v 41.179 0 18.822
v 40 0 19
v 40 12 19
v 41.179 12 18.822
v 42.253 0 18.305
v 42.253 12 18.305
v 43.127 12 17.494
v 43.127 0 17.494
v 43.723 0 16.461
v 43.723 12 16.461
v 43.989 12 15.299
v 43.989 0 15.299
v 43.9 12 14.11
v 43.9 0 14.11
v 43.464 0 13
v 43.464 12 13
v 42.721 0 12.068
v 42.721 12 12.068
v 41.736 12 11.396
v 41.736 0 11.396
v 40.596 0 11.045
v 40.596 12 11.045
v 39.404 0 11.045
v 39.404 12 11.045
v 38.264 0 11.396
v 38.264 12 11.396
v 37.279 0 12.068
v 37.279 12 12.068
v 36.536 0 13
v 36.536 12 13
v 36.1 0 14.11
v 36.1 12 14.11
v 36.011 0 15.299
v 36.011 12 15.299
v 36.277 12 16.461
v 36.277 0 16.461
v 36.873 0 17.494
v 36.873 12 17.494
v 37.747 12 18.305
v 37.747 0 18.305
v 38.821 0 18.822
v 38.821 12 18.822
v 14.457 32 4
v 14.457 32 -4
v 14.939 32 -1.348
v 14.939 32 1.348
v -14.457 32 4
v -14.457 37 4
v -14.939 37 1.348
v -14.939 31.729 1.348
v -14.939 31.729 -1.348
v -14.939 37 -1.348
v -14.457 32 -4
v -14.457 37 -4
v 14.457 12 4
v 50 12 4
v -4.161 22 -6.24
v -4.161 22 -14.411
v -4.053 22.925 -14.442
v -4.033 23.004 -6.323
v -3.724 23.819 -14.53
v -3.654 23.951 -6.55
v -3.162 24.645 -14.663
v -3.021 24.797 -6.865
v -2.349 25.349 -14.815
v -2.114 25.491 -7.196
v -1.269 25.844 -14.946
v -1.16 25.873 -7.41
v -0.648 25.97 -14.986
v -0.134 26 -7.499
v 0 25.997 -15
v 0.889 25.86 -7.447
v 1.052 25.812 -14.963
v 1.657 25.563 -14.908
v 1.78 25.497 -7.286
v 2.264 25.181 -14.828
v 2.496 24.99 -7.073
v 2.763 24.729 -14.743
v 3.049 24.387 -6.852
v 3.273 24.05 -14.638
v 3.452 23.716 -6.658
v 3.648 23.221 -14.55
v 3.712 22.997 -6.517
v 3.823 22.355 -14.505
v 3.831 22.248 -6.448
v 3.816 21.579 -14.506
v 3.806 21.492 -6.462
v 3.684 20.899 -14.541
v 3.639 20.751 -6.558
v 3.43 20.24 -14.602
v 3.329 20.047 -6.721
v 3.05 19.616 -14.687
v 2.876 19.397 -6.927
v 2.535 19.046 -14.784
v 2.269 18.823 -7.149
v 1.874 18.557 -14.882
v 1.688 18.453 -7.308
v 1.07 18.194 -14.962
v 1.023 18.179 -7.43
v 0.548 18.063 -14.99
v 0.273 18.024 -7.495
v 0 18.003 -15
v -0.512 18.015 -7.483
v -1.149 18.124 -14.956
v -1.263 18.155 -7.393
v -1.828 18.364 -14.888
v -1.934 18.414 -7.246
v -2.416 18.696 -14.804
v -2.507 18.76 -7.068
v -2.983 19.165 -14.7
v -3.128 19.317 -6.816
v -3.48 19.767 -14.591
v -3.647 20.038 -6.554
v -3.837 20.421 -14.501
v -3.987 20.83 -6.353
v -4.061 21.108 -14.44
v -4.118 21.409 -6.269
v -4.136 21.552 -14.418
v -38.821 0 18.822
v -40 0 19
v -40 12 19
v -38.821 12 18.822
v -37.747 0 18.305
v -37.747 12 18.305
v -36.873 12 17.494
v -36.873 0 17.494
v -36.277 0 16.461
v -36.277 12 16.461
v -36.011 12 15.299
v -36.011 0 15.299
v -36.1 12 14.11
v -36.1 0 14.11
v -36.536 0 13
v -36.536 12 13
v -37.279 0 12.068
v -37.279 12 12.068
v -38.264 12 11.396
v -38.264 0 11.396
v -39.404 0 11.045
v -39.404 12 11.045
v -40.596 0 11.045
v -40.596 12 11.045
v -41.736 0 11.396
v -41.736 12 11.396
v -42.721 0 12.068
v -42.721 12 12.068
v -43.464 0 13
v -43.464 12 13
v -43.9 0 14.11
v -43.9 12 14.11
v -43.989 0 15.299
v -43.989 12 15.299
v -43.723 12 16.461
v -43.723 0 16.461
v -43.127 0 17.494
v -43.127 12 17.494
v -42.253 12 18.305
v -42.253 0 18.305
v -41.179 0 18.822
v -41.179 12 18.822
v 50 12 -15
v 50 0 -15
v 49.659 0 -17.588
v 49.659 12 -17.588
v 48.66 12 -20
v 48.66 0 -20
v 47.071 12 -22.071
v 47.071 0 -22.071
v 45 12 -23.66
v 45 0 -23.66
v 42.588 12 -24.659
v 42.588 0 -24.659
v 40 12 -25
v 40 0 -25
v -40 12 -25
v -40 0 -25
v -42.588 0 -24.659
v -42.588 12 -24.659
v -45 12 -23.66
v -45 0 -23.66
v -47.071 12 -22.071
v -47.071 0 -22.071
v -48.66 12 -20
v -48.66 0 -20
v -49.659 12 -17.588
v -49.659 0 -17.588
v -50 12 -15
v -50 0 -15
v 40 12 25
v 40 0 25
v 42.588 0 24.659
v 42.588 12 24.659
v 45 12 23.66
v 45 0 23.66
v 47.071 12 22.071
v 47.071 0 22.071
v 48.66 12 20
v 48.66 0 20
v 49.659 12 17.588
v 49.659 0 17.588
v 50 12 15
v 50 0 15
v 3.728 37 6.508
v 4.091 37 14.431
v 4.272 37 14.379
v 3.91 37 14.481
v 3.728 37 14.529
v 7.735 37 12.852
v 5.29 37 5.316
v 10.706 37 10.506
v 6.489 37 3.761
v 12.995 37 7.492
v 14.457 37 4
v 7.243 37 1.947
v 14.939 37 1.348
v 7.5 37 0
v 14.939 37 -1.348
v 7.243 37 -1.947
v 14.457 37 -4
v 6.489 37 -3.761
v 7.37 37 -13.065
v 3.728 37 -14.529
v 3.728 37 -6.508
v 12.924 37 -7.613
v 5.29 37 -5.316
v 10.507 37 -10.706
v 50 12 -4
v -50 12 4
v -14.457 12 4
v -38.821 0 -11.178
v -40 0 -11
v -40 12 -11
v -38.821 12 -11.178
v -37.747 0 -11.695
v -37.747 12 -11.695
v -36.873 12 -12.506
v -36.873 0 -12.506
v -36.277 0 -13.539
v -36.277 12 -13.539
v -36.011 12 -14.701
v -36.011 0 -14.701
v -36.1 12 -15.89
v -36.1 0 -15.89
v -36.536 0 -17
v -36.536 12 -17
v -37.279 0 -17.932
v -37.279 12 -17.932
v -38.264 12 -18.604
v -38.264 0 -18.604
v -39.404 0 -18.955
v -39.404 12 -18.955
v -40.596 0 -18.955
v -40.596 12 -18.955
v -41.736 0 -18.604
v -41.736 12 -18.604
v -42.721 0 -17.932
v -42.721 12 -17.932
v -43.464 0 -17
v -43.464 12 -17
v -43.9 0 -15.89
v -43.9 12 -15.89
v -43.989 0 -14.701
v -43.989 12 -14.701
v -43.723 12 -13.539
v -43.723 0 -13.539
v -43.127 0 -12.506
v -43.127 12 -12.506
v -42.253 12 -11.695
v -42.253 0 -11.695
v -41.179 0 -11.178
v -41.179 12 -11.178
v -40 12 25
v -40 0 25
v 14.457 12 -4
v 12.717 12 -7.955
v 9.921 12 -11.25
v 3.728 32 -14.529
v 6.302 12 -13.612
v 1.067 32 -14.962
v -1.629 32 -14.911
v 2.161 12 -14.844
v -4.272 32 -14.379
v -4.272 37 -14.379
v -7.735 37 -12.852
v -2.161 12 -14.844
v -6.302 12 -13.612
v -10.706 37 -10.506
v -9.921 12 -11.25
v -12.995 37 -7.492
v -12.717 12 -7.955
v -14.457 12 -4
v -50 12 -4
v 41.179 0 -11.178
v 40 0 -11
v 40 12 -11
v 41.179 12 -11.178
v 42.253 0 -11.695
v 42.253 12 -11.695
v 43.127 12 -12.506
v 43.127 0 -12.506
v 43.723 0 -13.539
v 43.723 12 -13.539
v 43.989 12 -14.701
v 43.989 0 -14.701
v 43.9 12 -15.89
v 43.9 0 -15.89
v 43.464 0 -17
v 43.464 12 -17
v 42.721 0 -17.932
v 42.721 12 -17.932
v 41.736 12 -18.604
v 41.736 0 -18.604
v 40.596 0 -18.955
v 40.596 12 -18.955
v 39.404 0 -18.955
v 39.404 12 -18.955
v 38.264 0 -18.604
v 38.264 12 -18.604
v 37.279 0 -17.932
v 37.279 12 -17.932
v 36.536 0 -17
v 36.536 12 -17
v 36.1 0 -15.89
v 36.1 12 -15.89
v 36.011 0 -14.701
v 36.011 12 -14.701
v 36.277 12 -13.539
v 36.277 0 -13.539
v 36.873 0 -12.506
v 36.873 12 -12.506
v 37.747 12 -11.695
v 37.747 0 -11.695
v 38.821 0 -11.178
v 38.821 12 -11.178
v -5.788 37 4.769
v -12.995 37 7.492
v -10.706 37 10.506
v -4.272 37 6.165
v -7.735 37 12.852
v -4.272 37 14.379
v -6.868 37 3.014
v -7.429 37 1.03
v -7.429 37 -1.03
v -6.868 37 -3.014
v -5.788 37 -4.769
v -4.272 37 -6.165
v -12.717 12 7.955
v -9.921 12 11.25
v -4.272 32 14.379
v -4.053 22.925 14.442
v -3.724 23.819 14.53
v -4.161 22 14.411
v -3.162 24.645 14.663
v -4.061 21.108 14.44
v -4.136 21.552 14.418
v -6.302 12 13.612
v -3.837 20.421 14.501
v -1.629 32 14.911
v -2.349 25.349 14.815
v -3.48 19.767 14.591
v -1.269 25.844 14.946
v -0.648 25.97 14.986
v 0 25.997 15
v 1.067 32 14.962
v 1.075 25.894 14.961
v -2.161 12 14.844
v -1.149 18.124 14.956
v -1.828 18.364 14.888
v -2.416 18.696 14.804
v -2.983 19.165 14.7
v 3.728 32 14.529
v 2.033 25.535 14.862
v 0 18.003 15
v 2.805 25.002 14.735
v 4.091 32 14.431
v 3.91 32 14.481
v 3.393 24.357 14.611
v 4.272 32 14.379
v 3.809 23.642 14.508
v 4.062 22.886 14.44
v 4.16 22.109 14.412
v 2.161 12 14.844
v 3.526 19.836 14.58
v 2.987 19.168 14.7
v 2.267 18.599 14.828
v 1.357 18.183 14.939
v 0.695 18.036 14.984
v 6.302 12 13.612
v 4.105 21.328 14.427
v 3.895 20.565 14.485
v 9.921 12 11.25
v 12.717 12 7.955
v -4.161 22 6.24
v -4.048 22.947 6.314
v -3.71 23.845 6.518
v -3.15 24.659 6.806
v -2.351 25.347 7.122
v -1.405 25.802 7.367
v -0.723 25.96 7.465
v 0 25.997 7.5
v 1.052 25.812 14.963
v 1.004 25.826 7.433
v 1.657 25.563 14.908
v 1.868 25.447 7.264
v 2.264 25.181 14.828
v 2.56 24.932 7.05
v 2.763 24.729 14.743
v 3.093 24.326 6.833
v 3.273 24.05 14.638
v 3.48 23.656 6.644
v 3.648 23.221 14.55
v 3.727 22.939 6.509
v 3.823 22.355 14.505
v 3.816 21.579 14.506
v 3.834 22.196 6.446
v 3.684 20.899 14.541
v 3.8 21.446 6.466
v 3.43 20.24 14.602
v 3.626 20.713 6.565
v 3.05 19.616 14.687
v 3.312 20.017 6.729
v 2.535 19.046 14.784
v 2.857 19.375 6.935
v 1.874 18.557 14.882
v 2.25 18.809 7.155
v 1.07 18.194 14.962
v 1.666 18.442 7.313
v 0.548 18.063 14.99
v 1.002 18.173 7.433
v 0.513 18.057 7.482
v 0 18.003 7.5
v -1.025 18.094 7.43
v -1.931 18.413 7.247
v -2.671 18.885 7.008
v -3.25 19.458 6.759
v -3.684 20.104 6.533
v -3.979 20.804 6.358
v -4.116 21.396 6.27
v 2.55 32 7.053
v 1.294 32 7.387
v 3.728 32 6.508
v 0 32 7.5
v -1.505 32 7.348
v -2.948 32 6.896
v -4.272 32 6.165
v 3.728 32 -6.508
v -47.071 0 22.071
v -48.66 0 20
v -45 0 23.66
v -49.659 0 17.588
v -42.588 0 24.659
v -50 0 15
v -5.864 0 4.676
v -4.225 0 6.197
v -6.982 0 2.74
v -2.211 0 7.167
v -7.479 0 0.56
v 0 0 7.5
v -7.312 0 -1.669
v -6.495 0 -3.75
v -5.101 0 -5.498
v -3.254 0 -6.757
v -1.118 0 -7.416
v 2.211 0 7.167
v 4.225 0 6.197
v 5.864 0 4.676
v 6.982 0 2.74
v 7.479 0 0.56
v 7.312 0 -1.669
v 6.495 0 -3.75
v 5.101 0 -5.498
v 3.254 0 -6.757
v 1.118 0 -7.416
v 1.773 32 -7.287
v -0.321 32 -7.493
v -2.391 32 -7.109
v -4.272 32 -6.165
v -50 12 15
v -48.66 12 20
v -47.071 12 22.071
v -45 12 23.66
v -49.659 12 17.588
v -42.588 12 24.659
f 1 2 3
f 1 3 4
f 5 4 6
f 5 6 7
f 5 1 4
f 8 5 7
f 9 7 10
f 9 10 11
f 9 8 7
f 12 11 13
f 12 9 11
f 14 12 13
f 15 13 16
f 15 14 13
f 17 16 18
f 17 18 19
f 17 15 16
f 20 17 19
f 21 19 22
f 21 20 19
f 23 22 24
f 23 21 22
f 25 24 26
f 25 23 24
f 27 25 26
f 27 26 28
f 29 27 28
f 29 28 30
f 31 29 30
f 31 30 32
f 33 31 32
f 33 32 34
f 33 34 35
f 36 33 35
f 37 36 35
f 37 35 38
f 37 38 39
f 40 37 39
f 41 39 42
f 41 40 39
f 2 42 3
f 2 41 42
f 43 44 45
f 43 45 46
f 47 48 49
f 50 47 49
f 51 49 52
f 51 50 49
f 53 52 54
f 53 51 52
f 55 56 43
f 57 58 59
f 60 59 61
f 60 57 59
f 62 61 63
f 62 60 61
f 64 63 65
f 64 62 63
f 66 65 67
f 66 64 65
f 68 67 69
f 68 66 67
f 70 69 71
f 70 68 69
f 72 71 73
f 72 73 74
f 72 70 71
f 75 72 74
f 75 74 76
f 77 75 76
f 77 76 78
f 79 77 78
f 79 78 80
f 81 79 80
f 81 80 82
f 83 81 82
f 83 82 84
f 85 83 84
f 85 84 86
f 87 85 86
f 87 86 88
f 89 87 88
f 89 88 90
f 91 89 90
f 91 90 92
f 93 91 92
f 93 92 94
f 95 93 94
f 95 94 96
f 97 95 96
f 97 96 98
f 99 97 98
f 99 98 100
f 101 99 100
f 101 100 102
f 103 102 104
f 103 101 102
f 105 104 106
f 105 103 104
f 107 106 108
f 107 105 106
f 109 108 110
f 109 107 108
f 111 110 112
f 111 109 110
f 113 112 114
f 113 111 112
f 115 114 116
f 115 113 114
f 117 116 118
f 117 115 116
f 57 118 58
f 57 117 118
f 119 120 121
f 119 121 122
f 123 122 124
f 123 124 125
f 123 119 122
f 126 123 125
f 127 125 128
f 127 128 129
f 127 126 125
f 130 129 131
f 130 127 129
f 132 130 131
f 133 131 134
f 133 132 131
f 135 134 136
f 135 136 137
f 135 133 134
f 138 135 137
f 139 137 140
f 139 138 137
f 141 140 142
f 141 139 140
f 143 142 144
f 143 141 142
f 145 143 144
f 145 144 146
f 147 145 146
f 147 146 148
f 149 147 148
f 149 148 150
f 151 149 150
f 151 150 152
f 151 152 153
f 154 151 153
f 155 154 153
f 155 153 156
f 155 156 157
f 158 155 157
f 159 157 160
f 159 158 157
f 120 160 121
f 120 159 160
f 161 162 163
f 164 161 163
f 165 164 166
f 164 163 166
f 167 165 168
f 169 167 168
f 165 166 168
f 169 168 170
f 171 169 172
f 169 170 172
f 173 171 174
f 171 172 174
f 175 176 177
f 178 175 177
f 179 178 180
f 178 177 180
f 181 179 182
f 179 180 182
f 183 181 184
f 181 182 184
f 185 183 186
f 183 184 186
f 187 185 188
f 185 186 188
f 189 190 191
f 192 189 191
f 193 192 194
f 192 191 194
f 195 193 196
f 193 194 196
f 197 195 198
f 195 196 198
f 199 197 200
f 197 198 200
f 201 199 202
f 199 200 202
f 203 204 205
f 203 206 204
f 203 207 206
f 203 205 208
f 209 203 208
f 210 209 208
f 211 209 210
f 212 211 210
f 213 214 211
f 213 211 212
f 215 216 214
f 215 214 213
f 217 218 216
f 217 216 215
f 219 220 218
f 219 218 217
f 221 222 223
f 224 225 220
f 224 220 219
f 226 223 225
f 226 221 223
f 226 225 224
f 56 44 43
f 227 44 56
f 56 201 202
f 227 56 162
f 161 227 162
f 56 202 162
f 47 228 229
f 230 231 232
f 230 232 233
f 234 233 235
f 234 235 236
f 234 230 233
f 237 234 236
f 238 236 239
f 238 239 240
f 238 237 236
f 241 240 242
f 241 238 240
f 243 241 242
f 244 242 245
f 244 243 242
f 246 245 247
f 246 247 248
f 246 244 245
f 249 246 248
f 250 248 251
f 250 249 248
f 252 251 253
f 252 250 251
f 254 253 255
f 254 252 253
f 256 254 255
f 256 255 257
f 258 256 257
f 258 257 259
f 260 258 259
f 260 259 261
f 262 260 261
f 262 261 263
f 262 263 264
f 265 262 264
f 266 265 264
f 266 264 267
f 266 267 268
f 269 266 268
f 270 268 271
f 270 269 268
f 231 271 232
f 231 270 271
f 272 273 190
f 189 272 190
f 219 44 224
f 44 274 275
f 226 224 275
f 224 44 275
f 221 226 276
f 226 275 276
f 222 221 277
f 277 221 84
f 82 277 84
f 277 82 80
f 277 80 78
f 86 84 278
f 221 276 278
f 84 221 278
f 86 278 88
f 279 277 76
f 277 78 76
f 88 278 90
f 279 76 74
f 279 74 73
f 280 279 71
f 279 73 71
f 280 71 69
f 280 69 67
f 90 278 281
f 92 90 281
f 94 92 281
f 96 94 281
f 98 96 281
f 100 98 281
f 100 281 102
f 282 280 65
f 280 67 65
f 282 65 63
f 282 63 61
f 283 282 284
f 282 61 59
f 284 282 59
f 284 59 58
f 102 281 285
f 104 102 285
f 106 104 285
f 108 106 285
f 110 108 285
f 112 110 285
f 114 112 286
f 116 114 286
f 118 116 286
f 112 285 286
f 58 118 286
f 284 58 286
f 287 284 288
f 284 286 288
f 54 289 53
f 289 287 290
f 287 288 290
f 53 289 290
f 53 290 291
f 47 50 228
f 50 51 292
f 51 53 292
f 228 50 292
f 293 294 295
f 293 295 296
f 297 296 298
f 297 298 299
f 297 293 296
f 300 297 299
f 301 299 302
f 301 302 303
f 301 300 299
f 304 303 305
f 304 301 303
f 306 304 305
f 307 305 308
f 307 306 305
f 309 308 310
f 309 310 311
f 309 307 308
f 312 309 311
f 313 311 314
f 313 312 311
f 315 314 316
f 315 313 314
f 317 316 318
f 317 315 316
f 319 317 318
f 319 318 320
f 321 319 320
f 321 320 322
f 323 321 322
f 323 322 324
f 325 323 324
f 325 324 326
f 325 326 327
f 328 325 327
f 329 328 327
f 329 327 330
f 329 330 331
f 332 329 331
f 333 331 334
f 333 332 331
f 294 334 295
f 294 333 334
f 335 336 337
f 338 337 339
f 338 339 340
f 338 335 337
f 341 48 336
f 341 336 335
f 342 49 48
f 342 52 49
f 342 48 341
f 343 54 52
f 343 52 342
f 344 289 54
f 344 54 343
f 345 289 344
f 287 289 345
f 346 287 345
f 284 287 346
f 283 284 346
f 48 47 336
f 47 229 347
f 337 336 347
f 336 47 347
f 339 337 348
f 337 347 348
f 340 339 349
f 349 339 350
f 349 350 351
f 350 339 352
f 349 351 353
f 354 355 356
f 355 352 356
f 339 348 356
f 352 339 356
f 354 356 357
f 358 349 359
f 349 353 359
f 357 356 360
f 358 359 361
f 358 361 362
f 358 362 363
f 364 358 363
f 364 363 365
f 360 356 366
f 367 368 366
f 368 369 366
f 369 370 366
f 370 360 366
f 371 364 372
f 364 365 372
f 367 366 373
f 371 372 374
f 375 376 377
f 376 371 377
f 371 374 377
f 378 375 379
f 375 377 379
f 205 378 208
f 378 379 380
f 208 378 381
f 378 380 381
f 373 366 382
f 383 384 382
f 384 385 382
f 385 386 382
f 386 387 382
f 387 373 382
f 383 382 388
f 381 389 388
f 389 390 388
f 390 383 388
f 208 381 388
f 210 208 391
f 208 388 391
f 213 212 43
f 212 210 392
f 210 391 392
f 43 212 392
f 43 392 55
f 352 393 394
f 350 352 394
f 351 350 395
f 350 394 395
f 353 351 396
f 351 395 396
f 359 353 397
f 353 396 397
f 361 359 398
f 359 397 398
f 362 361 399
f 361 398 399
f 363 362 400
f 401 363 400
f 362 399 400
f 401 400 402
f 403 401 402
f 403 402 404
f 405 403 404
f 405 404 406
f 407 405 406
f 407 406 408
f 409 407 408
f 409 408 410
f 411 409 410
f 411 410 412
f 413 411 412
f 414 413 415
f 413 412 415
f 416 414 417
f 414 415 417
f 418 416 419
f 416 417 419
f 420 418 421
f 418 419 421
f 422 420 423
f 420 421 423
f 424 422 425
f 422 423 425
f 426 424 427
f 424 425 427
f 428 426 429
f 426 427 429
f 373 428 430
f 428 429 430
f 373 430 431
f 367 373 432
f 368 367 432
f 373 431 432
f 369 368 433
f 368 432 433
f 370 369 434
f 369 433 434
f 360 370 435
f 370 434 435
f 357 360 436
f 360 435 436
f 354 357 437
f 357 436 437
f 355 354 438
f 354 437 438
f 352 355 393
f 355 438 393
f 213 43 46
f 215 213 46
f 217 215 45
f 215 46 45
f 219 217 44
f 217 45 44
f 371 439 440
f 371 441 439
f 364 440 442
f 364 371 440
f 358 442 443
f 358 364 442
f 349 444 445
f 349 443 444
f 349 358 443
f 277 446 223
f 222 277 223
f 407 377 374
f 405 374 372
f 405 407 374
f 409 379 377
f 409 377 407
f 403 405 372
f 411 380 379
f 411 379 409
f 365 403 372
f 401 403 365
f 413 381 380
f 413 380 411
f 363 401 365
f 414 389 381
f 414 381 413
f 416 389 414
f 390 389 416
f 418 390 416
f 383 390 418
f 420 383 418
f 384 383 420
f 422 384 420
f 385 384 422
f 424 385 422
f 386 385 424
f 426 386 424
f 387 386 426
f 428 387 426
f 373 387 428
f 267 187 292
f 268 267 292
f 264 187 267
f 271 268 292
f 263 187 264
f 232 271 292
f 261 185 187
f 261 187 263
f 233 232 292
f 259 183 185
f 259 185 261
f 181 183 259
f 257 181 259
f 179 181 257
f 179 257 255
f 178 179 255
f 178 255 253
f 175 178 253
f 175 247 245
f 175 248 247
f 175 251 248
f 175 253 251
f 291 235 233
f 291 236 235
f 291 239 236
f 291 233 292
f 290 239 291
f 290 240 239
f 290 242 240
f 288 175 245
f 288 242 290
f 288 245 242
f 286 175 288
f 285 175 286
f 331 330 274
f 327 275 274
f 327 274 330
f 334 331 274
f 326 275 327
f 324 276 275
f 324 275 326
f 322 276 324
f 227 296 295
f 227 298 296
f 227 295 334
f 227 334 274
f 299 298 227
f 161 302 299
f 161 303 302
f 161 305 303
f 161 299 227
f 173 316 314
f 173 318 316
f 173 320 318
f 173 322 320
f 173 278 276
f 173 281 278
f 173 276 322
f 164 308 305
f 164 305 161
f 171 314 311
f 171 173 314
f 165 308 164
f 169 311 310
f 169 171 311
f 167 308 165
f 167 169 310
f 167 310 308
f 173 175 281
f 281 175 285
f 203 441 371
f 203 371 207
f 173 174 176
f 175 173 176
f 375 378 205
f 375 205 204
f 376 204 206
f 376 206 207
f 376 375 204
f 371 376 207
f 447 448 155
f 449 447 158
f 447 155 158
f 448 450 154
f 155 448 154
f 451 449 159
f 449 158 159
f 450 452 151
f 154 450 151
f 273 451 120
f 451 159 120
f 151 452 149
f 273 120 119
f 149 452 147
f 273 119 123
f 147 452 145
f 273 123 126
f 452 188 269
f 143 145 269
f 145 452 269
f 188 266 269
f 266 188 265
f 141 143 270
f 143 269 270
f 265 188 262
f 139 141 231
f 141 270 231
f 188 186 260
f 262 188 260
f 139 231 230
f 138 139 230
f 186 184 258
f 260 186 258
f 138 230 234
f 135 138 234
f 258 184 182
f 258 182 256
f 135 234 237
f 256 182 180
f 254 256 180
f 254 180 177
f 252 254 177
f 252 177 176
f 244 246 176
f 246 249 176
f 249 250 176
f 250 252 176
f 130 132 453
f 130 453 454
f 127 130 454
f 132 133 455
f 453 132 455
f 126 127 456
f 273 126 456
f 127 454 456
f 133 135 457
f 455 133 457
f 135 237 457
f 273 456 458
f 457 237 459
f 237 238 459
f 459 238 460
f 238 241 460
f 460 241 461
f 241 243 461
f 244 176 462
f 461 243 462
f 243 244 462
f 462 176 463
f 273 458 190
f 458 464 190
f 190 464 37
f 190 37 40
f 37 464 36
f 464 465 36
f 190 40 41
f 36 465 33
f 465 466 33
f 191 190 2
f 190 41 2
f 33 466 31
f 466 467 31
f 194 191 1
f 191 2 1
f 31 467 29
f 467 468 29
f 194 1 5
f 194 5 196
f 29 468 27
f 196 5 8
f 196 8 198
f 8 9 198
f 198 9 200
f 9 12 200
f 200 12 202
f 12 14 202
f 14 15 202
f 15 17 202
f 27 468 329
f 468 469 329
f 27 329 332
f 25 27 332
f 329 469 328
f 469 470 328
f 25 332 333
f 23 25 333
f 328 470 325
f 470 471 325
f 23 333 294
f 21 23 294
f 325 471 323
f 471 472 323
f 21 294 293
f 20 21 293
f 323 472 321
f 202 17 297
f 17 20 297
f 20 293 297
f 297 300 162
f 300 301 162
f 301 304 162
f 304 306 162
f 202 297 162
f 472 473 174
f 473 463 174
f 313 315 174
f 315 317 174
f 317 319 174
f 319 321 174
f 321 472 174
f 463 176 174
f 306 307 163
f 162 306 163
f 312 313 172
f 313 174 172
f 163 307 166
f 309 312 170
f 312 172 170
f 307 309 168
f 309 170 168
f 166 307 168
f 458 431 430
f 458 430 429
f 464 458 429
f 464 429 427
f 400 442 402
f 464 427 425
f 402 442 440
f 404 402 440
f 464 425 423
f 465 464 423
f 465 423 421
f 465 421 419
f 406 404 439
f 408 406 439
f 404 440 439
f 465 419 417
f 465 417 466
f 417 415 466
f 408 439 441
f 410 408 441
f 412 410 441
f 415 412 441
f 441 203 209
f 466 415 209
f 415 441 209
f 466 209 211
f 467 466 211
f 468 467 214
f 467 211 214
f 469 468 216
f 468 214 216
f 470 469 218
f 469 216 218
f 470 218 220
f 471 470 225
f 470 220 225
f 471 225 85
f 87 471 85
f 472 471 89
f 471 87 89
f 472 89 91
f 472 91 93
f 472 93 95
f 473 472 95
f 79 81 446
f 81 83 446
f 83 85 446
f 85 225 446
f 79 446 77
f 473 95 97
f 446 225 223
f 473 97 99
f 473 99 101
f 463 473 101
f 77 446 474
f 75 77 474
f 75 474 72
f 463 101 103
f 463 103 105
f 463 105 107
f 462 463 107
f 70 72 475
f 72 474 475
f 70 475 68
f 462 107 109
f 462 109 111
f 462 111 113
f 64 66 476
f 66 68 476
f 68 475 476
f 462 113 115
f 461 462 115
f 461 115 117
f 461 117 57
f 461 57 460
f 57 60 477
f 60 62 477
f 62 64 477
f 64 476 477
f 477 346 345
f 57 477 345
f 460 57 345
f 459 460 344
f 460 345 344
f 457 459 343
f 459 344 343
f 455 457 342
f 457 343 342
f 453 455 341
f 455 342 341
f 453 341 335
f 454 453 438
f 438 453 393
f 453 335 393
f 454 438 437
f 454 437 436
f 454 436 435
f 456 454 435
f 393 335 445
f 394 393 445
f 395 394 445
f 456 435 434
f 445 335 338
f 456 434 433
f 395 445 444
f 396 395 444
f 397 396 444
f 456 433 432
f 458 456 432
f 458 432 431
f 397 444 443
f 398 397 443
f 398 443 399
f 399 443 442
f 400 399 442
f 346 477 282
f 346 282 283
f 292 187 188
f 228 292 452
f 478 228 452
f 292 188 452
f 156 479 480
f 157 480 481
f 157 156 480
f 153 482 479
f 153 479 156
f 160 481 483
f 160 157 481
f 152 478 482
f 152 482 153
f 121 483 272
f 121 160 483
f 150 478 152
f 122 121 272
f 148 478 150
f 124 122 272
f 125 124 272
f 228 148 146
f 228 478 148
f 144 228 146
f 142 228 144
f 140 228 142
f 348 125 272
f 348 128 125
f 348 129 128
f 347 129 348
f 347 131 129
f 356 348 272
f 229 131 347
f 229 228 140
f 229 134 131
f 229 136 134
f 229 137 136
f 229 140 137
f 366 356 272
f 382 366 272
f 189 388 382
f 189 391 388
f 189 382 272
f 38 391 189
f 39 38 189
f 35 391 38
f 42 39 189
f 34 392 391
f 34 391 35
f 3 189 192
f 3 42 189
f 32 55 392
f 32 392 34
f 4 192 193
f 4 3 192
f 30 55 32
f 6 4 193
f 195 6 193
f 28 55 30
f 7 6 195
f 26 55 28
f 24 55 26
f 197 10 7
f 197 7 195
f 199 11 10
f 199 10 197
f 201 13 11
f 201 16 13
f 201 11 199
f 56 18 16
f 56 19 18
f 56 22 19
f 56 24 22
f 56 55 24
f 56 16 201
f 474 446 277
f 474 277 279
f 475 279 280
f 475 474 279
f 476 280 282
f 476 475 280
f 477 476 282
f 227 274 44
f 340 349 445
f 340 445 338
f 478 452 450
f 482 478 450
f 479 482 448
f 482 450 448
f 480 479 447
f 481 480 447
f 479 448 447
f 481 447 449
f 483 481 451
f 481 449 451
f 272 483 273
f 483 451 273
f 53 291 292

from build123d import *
from build123d.topology import SkipClean

# Parameters (mm, degrees)
SKETCH_1_R          = 4
EXTRUDE_1_DEPTH     = 12
EXTRUDE_3_DEPTH     = 25
CUT_EXTRUDE_START   = -5
CUT_EXTRUDE_2_DEPTH = 5
SKETCH_6_R          = 4
SKETCH_6_W          = 8
SKETCH_6_H          = 5
CUT_EXTRUDE_3_DEPTH = 69.62944
SKETCH_10_R         = 7.5
CUT_EXTRUDE_4_DEPTH = 68.037303


with BuildPart() as part:
    # 草图1 → 凸台-拉伸1 (new body)
    with BuildSketch(Plane(origin=(0, 0, 0), x_dir=(1, 0, 0), z_dir=(0, 1, 0))):
        with BuildLine():
            ThreePointArc((-40, 25), (-47.071068, 22.071068), (-50, 15))
            Line((-50, 15), (-50, -15))
            ThreePointArc((-50, -15), (-47.071068, -22.071068), (-40, -25))
            Line((-40, -25), (40, -25))
            ThreePointArc((40, -25), (47.071068, -22.071068), (50, -15))
            Line((50, -15), (50, 15))
            ThreePointArc((50, 15), (47.071068, 22.071068), (40, 25))
            Line((40, 25), (-40, 25))
        make_face()
        with Locations((-40, -15)):
            Circle(SKETCH_1_R, mode=Mode.SUBTRACT)
        with Locations((40, -15)):
            Circle(SKETCH_1_R, mode=Mode.SUBTRACT)
        with Locations((-40, 15)):
            Circle(SKETCH_1_R, mode=Mode.SUBTRACT)
        with Locations((40, 15)):
            Circle(SKETCH_1_R, mode=Mode.SUBTRACT)
    extrude(amount=EXTRUDE_1_DEPTH)

    # 草图3 → 凸台-拉伸3 (add)
    with BuildSketch(Plane(origin=(0, 12, 0), x_dir=(1, 0, 0), z_dir=(0, 1, 0))):
        with BuildLine():
            Line((-50, -4), (-14.456832, -4))
            ThreePointArc((-14.456832, -4), (15, 0), (-14.456832, 4))
            Line((-14.456832, 4), (-50, 4))
            Line((-50, 4), (-50, -4))
        make_face()
    extrude_3 = extrude(amount=EXTRUDE_3_DEPTH)

    # 草图7 → 切除-拉伸2 (cut)
    with SkipClean():  # the faces are left unmerged after this step: merging them gives an invalid solid
        with BuildSketch(Plane(origin=(0, 37, 0), x_dir=(1, 0, 0), z_dir=(0, 1, 0)).offset(CUT_EXTRUDE_START)):
            with BuildLine():
                Line((-14.456832, 4), (-50, 4))
                Line((-50, 4), (-50, -4))
                Line((-50, -4), (-14.456832, -4))
                ThreePointArc((-14.456832, -4), (-15, 0), (-14.456832, 4))
            make_face()
        cut_extrude_2 = extrude(amount=CUT_EXTRUDE_2_DEPTH, mode=Mode.SUBTRACT)

    # 草图6 → 切除-拉伸3 (cut, symmetric)
    with SkipClean():  # the faces are left unmerged after this step: merging them gives an invalid solid
        with BuildSketch(Plane.XY.offset(4)):
            with Locations((0.161482, 22)):
                Circle(SKETCH_6_R)
            Polygon((-14.456832, 32), (-50, 12), (-50, 32), align=None)
            with Locations((0.271584, 34.5)):
                Rectangle(SKETCH_6_W, SKETCH_6_H)
        cut_extrude_3 = extrude(amount=CUT_EXTRUDE_3_DEPTH, both=True, mode=Mode.SUBTRACT)

    # 镜向3: 凸台-拉伸3, 切除-拉伸2, 切除-拉伸3 across plane
    add(extrude_3.mirror(Plane(origin=(0, 0, 0), x_dir=(0, 0, 1), z_dir=(1, 0, 0))))
    add(cut_extrude_2.mirror(Plane(origin=(0, 0, 0), x_dir=(0, 0, 1), z_dir=(1, 0, 0))), mode=Mode.SUBTRACT)
    add(cut_extrude_3.mirror(Plane(origin=(0, 0, 0), x_dir=(0, 0, 1), z_dir=(1, 0, 0))), mode=Mode.SUBTRACT)

    # 草图10 → 切除-拉伸4 (cut, through all)
    with BuildSketch(Plane(origin=(0, 37, 0), x_dir=(1, 0, 0), z_dir=(0, 1, 0))):
        Circle(SKETCH_10_R)
    extrude(amount=-CUT_EXTRUDE_4_DEPTH, mode=Mode.SUBTRACT)


solid = part.part
